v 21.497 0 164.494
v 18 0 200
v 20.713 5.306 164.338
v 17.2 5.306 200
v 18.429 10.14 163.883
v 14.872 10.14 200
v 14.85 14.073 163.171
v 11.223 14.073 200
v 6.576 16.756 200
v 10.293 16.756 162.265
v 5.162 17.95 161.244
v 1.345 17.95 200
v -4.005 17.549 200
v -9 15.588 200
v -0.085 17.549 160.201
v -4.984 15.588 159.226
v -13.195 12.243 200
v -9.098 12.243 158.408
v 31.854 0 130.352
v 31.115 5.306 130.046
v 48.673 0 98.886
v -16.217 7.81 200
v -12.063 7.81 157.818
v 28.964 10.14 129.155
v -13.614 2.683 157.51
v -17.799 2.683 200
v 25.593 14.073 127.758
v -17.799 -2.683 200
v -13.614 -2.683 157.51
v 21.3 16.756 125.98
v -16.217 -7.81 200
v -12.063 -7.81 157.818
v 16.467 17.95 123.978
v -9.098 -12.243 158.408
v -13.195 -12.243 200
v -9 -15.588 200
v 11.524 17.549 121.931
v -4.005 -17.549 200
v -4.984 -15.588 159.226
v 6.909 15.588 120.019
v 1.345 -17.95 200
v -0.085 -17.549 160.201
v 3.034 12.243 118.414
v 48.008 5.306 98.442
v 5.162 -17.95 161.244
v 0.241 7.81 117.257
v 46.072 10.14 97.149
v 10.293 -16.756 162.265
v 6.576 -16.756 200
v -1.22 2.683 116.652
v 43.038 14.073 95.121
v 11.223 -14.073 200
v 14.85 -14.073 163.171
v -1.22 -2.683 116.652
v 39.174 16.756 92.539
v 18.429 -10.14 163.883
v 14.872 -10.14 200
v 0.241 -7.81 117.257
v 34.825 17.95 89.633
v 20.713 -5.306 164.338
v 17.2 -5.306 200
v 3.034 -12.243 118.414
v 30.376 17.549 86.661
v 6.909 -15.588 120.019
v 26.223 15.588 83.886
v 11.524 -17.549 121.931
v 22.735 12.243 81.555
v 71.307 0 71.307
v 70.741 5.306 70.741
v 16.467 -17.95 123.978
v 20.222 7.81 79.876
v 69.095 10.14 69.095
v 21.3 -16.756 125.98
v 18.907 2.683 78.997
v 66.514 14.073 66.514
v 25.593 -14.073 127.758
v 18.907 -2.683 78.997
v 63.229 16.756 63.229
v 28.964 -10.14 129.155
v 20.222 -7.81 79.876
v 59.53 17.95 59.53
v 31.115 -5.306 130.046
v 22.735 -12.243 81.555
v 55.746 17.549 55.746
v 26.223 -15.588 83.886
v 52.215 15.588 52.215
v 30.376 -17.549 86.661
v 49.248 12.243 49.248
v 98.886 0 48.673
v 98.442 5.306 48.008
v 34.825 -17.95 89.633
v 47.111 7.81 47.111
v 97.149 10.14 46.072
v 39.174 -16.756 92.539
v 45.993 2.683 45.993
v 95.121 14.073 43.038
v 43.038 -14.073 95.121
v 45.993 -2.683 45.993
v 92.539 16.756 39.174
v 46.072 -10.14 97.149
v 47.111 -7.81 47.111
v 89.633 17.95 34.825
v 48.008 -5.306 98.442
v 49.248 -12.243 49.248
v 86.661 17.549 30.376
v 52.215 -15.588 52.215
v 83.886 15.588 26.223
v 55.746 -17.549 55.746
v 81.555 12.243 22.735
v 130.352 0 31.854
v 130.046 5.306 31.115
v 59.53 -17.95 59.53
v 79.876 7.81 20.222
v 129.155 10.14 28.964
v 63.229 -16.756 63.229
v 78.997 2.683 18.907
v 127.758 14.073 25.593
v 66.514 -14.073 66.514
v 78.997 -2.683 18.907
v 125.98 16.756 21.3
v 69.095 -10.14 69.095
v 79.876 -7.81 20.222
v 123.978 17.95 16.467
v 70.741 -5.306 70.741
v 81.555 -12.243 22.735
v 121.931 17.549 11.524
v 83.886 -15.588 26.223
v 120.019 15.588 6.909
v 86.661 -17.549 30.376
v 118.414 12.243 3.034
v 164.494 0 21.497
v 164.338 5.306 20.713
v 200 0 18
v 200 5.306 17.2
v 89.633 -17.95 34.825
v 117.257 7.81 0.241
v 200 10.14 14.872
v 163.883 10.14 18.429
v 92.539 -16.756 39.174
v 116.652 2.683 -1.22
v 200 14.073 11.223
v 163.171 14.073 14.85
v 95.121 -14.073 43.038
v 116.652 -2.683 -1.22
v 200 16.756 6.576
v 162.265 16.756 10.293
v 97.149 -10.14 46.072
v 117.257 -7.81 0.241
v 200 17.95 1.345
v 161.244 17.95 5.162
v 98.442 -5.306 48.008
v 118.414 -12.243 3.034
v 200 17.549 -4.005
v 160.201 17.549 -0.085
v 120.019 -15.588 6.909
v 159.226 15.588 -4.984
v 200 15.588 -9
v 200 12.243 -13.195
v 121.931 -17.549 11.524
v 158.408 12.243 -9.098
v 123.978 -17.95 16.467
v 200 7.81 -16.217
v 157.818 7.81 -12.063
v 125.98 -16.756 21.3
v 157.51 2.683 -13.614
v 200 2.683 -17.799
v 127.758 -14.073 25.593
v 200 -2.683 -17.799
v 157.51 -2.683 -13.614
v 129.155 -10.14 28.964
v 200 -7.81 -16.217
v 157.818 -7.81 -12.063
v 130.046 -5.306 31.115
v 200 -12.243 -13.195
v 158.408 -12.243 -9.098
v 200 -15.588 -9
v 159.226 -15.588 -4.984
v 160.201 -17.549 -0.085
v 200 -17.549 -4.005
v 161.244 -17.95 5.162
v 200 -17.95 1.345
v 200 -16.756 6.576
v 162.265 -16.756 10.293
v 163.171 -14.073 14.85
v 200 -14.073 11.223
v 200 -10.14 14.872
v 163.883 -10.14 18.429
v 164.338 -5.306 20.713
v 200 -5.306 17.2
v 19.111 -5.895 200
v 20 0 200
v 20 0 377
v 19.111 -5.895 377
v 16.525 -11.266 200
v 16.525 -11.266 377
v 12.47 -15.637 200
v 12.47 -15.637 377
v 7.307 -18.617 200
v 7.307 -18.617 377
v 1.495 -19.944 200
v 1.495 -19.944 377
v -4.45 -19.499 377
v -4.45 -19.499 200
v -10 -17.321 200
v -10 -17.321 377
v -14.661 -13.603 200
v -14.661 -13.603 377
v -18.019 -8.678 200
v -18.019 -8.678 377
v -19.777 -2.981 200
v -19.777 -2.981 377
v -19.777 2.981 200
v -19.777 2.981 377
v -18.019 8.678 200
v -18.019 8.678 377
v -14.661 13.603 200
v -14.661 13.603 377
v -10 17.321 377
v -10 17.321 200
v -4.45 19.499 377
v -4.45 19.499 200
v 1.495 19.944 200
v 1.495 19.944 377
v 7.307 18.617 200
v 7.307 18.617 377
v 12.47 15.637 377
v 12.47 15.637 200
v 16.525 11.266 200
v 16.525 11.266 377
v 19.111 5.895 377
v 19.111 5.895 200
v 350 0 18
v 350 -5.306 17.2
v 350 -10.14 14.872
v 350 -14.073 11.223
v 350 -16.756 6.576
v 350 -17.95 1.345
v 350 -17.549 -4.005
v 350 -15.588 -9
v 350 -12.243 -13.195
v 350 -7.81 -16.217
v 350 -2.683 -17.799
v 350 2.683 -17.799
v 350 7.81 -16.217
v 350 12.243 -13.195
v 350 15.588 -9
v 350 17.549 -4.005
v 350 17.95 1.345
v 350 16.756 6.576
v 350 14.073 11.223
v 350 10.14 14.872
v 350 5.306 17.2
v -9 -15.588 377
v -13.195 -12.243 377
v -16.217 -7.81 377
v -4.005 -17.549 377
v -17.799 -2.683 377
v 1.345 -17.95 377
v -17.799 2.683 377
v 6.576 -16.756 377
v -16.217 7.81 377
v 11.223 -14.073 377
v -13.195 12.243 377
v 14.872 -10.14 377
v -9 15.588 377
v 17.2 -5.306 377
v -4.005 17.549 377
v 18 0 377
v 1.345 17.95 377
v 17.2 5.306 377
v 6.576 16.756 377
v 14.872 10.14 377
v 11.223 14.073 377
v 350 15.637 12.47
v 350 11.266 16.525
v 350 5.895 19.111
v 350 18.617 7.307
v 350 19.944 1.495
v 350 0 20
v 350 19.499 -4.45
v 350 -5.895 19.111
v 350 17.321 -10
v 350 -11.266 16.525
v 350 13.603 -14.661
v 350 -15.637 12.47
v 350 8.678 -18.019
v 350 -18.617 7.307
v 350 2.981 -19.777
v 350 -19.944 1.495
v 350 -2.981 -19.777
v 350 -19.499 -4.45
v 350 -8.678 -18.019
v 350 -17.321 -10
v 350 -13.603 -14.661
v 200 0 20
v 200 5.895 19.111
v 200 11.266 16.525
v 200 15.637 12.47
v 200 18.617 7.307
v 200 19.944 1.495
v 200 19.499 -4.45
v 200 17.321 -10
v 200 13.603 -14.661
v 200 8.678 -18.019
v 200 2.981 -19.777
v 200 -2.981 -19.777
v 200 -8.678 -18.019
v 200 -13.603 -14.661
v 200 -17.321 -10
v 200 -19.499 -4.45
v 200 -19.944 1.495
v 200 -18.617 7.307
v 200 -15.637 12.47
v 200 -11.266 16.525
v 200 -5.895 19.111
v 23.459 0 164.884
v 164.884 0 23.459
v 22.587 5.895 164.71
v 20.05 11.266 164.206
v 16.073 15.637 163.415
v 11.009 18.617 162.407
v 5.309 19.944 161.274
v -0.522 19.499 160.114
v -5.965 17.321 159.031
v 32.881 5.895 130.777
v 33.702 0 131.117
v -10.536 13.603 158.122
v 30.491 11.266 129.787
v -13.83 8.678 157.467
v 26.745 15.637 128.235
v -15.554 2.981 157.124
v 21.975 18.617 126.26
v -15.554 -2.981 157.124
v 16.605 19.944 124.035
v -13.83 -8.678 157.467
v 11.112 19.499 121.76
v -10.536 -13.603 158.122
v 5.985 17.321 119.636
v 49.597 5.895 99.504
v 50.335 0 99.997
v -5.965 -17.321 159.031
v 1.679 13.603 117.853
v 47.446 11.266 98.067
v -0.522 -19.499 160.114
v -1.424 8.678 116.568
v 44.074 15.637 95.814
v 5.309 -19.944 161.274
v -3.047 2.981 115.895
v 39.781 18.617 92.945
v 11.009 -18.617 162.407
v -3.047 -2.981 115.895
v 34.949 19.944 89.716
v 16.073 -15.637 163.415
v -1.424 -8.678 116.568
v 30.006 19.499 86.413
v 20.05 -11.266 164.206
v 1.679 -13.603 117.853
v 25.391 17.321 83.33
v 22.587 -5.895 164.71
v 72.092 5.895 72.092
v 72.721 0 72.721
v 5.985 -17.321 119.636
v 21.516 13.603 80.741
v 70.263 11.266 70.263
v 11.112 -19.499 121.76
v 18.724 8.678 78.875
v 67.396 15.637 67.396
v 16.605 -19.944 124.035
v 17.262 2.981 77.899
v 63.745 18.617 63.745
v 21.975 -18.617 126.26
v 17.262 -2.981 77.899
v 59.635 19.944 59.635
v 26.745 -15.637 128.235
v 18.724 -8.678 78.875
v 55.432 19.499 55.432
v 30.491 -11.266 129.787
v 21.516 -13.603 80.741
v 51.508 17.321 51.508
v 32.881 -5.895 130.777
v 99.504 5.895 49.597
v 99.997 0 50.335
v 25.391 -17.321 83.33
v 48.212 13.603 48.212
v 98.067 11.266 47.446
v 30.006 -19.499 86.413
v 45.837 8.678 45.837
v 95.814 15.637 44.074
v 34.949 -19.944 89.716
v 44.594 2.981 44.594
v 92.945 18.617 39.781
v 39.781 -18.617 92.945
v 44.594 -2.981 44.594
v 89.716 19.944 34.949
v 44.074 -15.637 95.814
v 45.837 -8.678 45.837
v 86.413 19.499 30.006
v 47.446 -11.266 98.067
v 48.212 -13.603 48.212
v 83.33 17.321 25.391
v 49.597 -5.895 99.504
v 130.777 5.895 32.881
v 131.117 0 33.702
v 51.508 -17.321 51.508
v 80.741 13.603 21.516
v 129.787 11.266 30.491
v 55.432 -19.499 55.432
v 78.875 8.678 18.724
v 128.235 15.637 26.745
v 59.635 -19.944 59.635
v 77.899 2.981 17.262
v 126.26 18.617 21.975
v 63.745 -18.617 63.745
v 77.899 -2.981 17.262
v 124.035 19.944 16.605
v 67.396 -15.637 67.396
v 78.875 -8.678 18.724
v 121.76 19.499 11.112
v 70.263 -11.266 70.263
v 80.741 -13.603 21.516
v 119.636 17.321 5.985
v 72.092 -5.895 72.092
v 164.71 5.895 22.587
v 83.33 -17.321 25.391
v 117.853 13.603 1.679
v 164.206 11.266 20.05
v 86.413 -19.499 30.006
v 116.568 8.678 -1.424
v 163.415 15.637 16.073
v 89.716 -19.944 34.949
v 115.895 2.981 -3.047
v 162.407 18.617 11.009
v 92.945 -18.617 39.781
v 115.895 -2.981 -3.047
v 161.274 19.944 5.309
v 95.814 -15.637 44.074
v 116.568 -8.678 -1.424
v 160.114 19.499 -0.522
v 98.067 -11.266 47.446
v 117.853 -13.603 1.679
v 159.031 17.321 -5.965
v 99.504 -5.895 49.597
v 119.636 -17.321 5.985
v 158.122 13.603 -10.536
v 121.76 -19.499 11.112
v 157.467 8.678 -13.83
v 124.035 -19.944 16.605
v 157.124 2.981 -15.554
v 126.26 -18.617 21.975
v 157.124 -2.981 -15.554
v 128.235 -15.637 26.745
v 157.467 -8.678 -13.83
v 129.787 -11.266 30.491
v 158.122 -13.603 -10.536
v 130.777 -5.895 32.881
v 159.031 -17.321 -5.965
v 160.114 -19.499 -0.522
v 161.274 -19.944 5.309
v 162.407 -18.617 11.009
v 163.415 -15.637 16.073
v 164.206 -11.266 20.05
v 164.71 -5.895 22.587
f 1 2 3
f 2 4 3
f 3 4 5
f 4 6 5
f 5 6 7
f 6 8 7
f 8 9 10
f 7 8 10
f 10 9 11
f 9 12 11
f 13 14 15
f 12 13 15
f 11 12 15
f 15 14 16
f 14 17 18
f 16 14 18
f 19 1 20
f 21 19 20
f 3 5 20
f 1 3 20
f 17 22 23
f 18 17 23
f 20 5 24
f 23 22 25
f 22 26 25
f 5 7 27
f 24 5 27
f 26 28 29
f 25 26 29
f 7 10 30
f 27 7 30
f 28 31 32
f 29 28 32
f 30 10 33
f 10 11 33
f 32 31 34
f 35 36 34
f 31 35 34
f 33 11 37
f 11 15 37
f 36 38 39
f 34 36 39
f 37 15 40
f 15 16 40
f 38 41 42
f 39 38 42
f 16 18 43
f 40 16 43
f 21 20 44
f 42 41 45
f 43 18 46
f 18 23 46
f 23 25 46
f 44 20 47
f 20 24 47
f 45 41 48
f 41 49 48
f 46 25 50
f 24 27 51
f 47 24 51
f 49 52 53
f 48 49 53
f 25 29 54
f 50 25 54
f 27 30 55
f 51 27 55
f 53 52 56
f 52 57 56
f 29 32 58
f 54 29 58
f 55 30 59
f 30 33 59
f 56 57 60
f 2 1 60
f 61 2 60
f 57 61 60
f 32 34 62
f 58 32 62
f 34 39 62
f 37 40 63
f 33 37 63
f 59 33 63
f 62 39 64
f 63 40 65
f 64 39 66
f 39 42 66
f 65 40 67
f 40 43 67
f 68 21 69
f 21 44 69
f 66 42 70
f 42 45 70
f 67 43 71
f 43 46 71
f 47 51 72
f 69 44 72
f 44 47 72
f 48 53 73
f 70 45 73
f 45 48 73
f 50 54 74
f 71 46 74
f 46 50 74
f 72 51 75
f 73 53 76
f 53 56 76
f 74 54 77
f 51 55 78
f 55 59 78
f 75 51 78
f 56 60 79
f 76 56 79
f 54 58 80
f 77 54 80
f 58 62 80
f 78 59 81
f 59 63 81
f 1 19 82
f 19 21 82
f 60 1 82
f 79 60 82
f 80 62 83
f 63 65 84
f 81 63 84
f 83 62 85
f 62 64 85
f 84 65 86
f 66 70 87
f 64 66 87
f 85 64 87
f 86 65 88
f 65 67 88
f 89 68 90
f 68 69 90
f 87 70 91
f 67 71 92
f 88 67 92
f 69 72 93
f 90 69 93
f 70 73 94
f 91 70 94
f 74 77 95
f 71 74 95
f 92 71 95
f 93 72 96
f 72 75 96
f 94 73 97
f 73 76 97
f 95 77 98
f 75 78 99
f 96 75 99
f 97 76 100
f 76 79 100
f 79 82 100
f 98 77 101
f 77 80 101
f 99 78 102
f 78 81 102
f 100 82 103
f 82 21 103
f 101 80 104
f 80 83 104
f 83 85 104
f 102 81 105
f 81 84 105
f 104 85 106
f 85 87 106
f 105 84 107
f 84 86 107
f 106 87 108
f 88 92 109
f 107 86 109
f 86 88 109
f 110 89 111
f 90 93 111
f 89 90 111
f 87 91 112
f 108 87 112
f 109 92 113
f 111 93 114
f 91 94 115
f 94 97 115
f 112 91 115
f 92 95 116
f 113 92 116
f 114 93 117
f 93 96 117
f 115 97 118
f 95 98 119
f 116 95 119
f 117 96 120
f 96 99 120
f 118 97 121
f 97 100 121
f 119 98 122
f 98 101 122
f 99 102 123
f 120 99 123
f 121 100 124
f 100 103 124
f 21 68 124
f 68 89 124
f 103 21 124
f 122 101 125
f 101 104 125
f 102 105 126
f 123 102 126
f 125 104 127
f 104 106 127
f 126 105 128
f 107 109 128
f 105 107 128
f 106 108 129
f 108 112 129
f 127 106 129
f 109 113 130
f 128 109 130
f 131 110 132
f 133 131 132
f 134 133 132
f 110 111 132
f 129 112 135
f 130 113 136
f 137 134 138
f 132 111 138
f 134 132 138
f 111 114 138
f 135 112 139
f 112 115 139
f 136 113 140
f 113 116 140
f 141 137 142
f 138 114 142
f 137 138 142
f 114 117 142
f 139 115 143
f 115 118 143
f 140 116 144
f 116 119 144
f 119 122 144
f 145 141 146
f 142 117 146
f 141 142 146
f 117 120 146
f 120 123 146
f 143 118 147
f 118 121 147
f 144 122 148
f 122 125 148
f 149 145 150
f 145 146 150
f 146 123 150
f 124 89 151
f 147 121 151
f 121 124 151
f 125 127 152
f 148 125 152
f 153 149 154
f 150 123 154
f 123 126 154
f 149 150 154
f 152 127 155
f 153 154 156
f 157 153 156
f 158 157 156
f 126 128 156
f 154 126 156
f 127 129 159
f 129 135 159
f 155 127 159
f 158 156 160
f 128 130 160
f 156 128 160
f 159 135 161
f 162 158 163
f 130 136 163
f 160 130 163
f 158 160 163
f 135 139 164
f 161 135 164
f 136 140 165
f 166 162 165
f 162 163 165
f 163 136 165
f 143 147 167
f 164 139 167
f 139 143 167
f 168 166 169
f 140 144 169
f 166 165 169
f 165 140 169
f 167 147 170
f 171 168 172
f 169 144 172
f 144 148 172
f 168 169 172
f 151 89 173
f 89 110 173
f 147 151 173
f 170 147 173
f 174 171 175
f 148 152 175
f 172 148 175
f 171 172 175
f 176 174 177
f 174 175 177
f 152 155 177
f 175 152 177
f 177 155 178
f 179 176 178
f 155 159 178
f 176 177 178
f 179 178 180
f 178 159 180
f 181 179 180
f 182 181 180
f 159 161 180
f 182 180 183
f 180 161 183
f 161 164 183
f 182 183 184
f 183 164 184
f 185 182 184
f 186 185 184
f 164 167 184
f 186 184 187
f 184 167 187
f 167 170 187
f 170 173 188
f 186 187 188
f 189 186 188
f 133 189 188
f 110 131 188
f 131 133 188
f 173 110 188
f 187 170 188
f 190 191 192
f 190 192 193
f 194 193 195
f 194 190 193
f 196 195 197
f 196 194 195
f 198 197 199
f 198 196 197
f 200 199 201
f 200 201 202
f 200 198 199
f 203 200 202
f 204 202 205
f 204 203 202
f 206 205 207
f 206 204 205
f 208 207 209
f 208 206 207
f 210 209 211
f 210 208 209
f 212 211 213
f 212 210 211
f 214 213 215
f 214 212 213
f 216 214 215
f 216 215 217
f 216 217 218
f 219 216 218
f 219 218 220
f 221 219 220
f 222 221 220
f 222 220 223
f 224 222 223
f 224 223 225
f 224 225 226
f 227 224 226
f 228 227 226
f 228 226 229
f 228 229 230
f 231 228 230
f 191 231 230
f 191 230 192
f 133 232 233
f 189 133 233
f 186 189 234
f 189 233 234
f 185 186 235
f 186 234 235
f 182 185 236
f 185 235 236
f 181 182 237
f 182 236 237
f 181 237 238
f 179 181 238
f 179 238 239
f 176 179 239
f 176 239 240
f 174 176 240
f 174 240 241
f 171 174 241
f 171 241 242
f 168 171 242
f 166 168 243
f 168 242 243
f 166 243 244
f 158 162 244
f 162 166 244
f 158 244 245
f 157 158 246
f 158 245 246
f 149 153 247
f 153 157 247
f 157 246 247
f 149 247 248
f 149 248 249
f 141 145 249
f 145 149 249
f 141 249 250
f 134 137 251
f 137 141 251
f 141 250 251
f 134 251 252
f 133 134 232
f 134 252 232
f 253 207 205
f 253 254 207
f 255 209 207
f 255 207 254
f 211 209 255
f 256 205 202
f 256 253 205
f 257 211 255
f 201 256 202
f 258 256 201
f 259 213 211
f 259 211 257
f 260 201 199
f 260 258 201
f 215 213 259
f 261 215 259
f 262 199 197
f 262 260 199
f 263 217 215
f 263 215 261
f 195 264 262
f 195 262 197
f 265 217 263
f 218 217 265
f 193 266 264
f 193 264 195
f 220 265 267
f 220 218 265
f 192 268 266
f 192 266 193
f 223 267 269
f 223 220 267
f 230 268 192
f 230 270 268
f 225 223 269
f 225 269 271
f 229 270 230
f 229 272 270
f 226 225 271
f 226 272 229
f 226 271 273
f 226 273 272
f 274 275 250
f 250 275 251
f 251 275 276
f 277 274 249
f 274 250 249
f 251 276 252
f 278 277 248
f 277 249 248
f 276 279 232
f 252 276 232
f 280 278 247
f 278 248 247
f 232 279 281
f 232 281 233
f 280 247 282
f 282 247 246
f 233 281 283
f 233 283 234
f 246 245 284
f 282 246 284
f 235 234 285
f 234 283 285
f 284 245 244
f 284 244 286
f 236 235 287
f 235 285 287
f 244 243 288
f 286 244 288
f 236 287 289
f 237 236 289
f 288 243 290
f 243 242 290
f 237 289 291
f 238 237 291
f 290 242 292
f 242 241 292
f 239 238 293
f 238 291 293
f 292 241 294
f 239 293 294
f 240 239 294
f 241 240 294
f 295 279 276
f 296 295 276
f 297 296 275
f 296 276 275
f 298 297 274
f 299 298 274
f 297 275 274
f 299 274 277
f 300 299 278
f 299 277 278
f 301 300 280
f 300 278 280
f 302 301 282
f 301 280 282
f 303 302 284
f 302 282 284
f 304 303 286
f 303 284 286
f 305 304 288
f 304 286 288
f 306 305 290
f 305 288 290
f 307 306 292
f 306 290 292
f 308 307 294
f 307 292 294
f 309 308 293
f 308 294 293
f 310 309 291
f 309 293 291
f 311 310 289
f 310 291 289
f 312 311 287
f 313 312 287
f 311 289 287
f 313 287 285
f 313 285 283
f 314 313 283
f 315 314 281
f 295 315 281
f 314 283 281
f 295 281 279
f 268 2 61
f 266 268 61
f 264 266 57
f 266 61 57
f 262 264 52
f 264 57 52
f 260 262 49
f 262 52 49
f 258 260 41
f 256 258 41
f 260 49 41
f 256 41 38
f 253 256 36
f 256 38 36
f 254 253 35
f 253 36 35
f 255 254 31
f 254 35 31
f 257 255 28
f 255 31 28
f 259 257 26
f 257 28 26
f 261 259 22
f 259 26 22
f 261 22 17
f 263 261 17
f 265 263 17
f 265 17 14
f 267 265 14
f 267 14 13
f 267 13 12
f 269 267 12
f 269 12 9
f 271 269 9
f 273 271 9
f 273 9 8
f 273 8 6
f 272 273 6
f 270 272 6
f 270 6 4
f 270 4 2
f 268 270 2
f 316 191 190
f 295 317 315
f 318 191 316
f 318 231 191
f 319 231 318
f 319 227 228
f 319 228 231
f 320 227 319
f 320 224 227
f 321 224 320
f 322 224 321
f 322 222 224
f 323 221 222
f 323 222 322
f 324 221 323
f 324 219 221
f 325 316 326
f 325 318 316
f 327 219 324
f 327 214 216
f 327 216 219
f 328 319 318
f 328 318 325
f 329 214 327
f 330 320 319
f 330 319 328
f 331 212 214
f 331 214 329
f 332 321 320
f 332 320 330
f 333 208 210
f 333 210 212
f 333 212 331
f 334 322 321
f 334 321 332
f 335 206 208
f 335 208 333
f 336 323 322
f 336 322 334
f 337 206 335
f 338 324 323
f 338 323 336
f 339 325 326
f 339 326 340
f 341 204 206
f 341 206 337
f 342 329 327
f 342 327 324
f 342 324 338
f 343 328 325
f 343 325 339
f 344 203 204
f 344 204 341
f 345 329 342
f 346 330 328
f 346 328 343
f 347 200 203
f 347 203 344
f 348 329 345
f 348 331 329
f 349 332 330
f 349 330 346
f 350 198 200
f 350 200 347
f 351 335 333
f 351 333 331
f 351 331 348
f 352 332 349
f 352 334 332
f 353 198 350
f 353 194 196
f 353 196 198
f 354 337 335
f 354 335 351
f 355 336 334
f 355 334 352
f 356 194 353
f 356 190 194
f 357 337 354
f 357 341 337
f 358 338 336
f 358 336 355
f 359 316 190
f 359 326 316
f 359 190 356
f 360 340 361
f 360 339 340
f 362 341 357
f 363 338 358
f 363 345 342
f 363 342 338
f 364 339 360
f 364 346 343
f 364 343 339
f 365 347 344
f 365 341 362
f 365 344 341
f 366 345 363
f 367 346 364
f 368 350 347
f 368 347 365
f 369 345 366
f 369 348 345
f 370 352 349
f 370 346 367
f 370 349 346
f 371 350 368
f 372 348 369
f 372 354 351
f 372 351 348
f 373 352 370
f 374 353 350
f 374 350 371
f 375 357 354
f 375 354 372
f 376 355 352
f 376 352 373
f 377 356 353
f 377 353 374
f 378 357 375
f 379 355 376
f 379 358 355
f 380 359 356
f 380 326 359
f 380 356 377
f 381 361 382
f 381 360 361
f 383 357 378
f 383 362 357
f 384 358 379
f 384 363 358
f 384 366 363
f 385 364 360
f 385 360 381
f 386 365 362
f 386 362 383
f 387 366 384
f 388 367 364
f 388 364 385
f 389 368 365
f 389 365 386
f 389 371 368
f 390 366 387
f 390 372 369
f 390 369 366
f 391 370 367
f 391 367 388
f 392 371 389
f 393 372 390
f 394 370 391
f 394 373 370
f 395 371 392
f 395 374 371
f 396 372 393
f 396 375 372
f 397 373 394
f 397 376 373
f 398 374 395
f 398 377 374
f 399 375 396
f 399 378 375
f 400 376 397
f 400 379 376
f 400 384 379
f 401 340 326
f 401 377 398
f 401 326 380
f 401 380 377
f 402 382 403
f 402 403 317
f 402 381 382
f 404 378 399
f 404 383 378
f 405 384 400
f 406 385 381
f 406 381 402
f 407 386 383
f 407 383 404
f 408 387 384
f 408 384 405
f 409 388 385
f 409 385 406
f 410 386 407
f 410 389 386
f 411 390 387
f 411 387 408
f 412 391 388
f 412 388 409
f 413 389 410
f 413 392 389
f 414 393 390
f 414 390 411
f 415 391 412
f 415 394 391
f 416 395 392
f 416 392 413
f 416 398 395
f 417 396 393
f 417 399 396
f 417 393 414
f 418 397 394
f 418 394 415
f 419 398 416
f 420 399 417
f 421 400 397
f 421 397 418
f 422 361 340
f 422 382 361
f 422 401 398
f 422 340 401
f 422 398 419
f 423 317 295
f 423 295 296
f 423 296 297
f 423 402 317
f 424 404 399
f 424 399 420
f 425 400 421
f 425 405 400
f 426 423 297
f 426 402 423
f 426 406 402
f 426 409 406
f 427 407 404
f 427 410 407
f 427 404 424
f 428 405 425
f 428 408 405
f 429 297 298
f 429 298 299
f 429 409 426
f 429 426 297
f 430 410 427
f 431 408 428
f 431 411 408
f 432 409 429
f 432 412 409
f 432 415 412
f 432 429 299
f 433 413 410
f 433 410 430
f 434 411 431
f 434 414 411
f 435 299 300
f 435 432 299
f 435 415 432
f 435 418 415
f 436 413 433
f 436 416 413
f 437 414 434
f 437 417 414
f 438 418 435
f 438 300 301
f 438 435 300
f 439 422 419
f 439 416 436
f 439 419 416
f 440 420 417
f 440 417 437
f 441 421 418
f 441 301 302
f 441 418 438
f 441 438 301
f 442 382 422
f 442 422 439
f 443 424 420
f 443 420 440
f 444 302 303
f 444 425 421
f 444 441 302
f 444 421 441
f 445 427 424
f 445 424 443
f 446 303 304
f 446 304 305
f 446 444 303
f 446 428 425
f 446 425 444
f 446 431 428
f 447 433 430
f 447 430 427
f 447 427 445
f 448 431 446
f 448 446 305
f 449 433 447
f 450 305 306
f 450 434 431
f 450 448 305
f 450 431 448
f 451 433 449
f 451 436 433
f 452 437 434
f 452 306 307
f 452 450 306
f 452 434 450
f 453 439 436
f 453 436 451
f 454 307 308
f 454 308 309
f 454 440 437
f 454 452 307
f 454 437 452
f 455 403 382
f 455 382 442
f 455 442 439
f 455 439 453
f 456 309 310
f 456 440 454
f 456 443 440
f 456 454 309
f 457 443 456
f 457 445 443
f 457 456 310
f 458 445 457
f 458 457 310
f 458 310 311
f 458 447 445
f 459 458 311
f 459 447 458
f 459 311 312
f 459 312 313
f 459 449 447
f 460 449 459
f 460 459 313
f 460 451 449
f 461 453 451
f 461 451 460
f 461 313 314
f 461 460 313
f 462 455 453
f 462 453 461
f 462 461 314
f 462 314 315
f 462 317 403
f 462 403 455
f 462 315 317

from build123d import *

# Parameters (mm, degrees)
F2_R   = 20
F2_R_2 = 18


with BuildPart() as f3:
    # F3: sweep along a path in F0
    with BuildLine(Plane.XZ) as f3_path:
        Line((0, 377), (0, 200))
        ThreePointArc((0, 200), (58.578644, 58.578644), (200, 0))
        Line((200, 0), (350, 0))
    # F2 (on plane+point) → F3 (sweep)
    with BuildSketch(Plane.XY.offset(377)):
        Circle(F2_R)
        Circle(F2_R_2, mode=Mode.SUBTRACT)
    sweep(path=f3_path.line)


solid = f3.part
